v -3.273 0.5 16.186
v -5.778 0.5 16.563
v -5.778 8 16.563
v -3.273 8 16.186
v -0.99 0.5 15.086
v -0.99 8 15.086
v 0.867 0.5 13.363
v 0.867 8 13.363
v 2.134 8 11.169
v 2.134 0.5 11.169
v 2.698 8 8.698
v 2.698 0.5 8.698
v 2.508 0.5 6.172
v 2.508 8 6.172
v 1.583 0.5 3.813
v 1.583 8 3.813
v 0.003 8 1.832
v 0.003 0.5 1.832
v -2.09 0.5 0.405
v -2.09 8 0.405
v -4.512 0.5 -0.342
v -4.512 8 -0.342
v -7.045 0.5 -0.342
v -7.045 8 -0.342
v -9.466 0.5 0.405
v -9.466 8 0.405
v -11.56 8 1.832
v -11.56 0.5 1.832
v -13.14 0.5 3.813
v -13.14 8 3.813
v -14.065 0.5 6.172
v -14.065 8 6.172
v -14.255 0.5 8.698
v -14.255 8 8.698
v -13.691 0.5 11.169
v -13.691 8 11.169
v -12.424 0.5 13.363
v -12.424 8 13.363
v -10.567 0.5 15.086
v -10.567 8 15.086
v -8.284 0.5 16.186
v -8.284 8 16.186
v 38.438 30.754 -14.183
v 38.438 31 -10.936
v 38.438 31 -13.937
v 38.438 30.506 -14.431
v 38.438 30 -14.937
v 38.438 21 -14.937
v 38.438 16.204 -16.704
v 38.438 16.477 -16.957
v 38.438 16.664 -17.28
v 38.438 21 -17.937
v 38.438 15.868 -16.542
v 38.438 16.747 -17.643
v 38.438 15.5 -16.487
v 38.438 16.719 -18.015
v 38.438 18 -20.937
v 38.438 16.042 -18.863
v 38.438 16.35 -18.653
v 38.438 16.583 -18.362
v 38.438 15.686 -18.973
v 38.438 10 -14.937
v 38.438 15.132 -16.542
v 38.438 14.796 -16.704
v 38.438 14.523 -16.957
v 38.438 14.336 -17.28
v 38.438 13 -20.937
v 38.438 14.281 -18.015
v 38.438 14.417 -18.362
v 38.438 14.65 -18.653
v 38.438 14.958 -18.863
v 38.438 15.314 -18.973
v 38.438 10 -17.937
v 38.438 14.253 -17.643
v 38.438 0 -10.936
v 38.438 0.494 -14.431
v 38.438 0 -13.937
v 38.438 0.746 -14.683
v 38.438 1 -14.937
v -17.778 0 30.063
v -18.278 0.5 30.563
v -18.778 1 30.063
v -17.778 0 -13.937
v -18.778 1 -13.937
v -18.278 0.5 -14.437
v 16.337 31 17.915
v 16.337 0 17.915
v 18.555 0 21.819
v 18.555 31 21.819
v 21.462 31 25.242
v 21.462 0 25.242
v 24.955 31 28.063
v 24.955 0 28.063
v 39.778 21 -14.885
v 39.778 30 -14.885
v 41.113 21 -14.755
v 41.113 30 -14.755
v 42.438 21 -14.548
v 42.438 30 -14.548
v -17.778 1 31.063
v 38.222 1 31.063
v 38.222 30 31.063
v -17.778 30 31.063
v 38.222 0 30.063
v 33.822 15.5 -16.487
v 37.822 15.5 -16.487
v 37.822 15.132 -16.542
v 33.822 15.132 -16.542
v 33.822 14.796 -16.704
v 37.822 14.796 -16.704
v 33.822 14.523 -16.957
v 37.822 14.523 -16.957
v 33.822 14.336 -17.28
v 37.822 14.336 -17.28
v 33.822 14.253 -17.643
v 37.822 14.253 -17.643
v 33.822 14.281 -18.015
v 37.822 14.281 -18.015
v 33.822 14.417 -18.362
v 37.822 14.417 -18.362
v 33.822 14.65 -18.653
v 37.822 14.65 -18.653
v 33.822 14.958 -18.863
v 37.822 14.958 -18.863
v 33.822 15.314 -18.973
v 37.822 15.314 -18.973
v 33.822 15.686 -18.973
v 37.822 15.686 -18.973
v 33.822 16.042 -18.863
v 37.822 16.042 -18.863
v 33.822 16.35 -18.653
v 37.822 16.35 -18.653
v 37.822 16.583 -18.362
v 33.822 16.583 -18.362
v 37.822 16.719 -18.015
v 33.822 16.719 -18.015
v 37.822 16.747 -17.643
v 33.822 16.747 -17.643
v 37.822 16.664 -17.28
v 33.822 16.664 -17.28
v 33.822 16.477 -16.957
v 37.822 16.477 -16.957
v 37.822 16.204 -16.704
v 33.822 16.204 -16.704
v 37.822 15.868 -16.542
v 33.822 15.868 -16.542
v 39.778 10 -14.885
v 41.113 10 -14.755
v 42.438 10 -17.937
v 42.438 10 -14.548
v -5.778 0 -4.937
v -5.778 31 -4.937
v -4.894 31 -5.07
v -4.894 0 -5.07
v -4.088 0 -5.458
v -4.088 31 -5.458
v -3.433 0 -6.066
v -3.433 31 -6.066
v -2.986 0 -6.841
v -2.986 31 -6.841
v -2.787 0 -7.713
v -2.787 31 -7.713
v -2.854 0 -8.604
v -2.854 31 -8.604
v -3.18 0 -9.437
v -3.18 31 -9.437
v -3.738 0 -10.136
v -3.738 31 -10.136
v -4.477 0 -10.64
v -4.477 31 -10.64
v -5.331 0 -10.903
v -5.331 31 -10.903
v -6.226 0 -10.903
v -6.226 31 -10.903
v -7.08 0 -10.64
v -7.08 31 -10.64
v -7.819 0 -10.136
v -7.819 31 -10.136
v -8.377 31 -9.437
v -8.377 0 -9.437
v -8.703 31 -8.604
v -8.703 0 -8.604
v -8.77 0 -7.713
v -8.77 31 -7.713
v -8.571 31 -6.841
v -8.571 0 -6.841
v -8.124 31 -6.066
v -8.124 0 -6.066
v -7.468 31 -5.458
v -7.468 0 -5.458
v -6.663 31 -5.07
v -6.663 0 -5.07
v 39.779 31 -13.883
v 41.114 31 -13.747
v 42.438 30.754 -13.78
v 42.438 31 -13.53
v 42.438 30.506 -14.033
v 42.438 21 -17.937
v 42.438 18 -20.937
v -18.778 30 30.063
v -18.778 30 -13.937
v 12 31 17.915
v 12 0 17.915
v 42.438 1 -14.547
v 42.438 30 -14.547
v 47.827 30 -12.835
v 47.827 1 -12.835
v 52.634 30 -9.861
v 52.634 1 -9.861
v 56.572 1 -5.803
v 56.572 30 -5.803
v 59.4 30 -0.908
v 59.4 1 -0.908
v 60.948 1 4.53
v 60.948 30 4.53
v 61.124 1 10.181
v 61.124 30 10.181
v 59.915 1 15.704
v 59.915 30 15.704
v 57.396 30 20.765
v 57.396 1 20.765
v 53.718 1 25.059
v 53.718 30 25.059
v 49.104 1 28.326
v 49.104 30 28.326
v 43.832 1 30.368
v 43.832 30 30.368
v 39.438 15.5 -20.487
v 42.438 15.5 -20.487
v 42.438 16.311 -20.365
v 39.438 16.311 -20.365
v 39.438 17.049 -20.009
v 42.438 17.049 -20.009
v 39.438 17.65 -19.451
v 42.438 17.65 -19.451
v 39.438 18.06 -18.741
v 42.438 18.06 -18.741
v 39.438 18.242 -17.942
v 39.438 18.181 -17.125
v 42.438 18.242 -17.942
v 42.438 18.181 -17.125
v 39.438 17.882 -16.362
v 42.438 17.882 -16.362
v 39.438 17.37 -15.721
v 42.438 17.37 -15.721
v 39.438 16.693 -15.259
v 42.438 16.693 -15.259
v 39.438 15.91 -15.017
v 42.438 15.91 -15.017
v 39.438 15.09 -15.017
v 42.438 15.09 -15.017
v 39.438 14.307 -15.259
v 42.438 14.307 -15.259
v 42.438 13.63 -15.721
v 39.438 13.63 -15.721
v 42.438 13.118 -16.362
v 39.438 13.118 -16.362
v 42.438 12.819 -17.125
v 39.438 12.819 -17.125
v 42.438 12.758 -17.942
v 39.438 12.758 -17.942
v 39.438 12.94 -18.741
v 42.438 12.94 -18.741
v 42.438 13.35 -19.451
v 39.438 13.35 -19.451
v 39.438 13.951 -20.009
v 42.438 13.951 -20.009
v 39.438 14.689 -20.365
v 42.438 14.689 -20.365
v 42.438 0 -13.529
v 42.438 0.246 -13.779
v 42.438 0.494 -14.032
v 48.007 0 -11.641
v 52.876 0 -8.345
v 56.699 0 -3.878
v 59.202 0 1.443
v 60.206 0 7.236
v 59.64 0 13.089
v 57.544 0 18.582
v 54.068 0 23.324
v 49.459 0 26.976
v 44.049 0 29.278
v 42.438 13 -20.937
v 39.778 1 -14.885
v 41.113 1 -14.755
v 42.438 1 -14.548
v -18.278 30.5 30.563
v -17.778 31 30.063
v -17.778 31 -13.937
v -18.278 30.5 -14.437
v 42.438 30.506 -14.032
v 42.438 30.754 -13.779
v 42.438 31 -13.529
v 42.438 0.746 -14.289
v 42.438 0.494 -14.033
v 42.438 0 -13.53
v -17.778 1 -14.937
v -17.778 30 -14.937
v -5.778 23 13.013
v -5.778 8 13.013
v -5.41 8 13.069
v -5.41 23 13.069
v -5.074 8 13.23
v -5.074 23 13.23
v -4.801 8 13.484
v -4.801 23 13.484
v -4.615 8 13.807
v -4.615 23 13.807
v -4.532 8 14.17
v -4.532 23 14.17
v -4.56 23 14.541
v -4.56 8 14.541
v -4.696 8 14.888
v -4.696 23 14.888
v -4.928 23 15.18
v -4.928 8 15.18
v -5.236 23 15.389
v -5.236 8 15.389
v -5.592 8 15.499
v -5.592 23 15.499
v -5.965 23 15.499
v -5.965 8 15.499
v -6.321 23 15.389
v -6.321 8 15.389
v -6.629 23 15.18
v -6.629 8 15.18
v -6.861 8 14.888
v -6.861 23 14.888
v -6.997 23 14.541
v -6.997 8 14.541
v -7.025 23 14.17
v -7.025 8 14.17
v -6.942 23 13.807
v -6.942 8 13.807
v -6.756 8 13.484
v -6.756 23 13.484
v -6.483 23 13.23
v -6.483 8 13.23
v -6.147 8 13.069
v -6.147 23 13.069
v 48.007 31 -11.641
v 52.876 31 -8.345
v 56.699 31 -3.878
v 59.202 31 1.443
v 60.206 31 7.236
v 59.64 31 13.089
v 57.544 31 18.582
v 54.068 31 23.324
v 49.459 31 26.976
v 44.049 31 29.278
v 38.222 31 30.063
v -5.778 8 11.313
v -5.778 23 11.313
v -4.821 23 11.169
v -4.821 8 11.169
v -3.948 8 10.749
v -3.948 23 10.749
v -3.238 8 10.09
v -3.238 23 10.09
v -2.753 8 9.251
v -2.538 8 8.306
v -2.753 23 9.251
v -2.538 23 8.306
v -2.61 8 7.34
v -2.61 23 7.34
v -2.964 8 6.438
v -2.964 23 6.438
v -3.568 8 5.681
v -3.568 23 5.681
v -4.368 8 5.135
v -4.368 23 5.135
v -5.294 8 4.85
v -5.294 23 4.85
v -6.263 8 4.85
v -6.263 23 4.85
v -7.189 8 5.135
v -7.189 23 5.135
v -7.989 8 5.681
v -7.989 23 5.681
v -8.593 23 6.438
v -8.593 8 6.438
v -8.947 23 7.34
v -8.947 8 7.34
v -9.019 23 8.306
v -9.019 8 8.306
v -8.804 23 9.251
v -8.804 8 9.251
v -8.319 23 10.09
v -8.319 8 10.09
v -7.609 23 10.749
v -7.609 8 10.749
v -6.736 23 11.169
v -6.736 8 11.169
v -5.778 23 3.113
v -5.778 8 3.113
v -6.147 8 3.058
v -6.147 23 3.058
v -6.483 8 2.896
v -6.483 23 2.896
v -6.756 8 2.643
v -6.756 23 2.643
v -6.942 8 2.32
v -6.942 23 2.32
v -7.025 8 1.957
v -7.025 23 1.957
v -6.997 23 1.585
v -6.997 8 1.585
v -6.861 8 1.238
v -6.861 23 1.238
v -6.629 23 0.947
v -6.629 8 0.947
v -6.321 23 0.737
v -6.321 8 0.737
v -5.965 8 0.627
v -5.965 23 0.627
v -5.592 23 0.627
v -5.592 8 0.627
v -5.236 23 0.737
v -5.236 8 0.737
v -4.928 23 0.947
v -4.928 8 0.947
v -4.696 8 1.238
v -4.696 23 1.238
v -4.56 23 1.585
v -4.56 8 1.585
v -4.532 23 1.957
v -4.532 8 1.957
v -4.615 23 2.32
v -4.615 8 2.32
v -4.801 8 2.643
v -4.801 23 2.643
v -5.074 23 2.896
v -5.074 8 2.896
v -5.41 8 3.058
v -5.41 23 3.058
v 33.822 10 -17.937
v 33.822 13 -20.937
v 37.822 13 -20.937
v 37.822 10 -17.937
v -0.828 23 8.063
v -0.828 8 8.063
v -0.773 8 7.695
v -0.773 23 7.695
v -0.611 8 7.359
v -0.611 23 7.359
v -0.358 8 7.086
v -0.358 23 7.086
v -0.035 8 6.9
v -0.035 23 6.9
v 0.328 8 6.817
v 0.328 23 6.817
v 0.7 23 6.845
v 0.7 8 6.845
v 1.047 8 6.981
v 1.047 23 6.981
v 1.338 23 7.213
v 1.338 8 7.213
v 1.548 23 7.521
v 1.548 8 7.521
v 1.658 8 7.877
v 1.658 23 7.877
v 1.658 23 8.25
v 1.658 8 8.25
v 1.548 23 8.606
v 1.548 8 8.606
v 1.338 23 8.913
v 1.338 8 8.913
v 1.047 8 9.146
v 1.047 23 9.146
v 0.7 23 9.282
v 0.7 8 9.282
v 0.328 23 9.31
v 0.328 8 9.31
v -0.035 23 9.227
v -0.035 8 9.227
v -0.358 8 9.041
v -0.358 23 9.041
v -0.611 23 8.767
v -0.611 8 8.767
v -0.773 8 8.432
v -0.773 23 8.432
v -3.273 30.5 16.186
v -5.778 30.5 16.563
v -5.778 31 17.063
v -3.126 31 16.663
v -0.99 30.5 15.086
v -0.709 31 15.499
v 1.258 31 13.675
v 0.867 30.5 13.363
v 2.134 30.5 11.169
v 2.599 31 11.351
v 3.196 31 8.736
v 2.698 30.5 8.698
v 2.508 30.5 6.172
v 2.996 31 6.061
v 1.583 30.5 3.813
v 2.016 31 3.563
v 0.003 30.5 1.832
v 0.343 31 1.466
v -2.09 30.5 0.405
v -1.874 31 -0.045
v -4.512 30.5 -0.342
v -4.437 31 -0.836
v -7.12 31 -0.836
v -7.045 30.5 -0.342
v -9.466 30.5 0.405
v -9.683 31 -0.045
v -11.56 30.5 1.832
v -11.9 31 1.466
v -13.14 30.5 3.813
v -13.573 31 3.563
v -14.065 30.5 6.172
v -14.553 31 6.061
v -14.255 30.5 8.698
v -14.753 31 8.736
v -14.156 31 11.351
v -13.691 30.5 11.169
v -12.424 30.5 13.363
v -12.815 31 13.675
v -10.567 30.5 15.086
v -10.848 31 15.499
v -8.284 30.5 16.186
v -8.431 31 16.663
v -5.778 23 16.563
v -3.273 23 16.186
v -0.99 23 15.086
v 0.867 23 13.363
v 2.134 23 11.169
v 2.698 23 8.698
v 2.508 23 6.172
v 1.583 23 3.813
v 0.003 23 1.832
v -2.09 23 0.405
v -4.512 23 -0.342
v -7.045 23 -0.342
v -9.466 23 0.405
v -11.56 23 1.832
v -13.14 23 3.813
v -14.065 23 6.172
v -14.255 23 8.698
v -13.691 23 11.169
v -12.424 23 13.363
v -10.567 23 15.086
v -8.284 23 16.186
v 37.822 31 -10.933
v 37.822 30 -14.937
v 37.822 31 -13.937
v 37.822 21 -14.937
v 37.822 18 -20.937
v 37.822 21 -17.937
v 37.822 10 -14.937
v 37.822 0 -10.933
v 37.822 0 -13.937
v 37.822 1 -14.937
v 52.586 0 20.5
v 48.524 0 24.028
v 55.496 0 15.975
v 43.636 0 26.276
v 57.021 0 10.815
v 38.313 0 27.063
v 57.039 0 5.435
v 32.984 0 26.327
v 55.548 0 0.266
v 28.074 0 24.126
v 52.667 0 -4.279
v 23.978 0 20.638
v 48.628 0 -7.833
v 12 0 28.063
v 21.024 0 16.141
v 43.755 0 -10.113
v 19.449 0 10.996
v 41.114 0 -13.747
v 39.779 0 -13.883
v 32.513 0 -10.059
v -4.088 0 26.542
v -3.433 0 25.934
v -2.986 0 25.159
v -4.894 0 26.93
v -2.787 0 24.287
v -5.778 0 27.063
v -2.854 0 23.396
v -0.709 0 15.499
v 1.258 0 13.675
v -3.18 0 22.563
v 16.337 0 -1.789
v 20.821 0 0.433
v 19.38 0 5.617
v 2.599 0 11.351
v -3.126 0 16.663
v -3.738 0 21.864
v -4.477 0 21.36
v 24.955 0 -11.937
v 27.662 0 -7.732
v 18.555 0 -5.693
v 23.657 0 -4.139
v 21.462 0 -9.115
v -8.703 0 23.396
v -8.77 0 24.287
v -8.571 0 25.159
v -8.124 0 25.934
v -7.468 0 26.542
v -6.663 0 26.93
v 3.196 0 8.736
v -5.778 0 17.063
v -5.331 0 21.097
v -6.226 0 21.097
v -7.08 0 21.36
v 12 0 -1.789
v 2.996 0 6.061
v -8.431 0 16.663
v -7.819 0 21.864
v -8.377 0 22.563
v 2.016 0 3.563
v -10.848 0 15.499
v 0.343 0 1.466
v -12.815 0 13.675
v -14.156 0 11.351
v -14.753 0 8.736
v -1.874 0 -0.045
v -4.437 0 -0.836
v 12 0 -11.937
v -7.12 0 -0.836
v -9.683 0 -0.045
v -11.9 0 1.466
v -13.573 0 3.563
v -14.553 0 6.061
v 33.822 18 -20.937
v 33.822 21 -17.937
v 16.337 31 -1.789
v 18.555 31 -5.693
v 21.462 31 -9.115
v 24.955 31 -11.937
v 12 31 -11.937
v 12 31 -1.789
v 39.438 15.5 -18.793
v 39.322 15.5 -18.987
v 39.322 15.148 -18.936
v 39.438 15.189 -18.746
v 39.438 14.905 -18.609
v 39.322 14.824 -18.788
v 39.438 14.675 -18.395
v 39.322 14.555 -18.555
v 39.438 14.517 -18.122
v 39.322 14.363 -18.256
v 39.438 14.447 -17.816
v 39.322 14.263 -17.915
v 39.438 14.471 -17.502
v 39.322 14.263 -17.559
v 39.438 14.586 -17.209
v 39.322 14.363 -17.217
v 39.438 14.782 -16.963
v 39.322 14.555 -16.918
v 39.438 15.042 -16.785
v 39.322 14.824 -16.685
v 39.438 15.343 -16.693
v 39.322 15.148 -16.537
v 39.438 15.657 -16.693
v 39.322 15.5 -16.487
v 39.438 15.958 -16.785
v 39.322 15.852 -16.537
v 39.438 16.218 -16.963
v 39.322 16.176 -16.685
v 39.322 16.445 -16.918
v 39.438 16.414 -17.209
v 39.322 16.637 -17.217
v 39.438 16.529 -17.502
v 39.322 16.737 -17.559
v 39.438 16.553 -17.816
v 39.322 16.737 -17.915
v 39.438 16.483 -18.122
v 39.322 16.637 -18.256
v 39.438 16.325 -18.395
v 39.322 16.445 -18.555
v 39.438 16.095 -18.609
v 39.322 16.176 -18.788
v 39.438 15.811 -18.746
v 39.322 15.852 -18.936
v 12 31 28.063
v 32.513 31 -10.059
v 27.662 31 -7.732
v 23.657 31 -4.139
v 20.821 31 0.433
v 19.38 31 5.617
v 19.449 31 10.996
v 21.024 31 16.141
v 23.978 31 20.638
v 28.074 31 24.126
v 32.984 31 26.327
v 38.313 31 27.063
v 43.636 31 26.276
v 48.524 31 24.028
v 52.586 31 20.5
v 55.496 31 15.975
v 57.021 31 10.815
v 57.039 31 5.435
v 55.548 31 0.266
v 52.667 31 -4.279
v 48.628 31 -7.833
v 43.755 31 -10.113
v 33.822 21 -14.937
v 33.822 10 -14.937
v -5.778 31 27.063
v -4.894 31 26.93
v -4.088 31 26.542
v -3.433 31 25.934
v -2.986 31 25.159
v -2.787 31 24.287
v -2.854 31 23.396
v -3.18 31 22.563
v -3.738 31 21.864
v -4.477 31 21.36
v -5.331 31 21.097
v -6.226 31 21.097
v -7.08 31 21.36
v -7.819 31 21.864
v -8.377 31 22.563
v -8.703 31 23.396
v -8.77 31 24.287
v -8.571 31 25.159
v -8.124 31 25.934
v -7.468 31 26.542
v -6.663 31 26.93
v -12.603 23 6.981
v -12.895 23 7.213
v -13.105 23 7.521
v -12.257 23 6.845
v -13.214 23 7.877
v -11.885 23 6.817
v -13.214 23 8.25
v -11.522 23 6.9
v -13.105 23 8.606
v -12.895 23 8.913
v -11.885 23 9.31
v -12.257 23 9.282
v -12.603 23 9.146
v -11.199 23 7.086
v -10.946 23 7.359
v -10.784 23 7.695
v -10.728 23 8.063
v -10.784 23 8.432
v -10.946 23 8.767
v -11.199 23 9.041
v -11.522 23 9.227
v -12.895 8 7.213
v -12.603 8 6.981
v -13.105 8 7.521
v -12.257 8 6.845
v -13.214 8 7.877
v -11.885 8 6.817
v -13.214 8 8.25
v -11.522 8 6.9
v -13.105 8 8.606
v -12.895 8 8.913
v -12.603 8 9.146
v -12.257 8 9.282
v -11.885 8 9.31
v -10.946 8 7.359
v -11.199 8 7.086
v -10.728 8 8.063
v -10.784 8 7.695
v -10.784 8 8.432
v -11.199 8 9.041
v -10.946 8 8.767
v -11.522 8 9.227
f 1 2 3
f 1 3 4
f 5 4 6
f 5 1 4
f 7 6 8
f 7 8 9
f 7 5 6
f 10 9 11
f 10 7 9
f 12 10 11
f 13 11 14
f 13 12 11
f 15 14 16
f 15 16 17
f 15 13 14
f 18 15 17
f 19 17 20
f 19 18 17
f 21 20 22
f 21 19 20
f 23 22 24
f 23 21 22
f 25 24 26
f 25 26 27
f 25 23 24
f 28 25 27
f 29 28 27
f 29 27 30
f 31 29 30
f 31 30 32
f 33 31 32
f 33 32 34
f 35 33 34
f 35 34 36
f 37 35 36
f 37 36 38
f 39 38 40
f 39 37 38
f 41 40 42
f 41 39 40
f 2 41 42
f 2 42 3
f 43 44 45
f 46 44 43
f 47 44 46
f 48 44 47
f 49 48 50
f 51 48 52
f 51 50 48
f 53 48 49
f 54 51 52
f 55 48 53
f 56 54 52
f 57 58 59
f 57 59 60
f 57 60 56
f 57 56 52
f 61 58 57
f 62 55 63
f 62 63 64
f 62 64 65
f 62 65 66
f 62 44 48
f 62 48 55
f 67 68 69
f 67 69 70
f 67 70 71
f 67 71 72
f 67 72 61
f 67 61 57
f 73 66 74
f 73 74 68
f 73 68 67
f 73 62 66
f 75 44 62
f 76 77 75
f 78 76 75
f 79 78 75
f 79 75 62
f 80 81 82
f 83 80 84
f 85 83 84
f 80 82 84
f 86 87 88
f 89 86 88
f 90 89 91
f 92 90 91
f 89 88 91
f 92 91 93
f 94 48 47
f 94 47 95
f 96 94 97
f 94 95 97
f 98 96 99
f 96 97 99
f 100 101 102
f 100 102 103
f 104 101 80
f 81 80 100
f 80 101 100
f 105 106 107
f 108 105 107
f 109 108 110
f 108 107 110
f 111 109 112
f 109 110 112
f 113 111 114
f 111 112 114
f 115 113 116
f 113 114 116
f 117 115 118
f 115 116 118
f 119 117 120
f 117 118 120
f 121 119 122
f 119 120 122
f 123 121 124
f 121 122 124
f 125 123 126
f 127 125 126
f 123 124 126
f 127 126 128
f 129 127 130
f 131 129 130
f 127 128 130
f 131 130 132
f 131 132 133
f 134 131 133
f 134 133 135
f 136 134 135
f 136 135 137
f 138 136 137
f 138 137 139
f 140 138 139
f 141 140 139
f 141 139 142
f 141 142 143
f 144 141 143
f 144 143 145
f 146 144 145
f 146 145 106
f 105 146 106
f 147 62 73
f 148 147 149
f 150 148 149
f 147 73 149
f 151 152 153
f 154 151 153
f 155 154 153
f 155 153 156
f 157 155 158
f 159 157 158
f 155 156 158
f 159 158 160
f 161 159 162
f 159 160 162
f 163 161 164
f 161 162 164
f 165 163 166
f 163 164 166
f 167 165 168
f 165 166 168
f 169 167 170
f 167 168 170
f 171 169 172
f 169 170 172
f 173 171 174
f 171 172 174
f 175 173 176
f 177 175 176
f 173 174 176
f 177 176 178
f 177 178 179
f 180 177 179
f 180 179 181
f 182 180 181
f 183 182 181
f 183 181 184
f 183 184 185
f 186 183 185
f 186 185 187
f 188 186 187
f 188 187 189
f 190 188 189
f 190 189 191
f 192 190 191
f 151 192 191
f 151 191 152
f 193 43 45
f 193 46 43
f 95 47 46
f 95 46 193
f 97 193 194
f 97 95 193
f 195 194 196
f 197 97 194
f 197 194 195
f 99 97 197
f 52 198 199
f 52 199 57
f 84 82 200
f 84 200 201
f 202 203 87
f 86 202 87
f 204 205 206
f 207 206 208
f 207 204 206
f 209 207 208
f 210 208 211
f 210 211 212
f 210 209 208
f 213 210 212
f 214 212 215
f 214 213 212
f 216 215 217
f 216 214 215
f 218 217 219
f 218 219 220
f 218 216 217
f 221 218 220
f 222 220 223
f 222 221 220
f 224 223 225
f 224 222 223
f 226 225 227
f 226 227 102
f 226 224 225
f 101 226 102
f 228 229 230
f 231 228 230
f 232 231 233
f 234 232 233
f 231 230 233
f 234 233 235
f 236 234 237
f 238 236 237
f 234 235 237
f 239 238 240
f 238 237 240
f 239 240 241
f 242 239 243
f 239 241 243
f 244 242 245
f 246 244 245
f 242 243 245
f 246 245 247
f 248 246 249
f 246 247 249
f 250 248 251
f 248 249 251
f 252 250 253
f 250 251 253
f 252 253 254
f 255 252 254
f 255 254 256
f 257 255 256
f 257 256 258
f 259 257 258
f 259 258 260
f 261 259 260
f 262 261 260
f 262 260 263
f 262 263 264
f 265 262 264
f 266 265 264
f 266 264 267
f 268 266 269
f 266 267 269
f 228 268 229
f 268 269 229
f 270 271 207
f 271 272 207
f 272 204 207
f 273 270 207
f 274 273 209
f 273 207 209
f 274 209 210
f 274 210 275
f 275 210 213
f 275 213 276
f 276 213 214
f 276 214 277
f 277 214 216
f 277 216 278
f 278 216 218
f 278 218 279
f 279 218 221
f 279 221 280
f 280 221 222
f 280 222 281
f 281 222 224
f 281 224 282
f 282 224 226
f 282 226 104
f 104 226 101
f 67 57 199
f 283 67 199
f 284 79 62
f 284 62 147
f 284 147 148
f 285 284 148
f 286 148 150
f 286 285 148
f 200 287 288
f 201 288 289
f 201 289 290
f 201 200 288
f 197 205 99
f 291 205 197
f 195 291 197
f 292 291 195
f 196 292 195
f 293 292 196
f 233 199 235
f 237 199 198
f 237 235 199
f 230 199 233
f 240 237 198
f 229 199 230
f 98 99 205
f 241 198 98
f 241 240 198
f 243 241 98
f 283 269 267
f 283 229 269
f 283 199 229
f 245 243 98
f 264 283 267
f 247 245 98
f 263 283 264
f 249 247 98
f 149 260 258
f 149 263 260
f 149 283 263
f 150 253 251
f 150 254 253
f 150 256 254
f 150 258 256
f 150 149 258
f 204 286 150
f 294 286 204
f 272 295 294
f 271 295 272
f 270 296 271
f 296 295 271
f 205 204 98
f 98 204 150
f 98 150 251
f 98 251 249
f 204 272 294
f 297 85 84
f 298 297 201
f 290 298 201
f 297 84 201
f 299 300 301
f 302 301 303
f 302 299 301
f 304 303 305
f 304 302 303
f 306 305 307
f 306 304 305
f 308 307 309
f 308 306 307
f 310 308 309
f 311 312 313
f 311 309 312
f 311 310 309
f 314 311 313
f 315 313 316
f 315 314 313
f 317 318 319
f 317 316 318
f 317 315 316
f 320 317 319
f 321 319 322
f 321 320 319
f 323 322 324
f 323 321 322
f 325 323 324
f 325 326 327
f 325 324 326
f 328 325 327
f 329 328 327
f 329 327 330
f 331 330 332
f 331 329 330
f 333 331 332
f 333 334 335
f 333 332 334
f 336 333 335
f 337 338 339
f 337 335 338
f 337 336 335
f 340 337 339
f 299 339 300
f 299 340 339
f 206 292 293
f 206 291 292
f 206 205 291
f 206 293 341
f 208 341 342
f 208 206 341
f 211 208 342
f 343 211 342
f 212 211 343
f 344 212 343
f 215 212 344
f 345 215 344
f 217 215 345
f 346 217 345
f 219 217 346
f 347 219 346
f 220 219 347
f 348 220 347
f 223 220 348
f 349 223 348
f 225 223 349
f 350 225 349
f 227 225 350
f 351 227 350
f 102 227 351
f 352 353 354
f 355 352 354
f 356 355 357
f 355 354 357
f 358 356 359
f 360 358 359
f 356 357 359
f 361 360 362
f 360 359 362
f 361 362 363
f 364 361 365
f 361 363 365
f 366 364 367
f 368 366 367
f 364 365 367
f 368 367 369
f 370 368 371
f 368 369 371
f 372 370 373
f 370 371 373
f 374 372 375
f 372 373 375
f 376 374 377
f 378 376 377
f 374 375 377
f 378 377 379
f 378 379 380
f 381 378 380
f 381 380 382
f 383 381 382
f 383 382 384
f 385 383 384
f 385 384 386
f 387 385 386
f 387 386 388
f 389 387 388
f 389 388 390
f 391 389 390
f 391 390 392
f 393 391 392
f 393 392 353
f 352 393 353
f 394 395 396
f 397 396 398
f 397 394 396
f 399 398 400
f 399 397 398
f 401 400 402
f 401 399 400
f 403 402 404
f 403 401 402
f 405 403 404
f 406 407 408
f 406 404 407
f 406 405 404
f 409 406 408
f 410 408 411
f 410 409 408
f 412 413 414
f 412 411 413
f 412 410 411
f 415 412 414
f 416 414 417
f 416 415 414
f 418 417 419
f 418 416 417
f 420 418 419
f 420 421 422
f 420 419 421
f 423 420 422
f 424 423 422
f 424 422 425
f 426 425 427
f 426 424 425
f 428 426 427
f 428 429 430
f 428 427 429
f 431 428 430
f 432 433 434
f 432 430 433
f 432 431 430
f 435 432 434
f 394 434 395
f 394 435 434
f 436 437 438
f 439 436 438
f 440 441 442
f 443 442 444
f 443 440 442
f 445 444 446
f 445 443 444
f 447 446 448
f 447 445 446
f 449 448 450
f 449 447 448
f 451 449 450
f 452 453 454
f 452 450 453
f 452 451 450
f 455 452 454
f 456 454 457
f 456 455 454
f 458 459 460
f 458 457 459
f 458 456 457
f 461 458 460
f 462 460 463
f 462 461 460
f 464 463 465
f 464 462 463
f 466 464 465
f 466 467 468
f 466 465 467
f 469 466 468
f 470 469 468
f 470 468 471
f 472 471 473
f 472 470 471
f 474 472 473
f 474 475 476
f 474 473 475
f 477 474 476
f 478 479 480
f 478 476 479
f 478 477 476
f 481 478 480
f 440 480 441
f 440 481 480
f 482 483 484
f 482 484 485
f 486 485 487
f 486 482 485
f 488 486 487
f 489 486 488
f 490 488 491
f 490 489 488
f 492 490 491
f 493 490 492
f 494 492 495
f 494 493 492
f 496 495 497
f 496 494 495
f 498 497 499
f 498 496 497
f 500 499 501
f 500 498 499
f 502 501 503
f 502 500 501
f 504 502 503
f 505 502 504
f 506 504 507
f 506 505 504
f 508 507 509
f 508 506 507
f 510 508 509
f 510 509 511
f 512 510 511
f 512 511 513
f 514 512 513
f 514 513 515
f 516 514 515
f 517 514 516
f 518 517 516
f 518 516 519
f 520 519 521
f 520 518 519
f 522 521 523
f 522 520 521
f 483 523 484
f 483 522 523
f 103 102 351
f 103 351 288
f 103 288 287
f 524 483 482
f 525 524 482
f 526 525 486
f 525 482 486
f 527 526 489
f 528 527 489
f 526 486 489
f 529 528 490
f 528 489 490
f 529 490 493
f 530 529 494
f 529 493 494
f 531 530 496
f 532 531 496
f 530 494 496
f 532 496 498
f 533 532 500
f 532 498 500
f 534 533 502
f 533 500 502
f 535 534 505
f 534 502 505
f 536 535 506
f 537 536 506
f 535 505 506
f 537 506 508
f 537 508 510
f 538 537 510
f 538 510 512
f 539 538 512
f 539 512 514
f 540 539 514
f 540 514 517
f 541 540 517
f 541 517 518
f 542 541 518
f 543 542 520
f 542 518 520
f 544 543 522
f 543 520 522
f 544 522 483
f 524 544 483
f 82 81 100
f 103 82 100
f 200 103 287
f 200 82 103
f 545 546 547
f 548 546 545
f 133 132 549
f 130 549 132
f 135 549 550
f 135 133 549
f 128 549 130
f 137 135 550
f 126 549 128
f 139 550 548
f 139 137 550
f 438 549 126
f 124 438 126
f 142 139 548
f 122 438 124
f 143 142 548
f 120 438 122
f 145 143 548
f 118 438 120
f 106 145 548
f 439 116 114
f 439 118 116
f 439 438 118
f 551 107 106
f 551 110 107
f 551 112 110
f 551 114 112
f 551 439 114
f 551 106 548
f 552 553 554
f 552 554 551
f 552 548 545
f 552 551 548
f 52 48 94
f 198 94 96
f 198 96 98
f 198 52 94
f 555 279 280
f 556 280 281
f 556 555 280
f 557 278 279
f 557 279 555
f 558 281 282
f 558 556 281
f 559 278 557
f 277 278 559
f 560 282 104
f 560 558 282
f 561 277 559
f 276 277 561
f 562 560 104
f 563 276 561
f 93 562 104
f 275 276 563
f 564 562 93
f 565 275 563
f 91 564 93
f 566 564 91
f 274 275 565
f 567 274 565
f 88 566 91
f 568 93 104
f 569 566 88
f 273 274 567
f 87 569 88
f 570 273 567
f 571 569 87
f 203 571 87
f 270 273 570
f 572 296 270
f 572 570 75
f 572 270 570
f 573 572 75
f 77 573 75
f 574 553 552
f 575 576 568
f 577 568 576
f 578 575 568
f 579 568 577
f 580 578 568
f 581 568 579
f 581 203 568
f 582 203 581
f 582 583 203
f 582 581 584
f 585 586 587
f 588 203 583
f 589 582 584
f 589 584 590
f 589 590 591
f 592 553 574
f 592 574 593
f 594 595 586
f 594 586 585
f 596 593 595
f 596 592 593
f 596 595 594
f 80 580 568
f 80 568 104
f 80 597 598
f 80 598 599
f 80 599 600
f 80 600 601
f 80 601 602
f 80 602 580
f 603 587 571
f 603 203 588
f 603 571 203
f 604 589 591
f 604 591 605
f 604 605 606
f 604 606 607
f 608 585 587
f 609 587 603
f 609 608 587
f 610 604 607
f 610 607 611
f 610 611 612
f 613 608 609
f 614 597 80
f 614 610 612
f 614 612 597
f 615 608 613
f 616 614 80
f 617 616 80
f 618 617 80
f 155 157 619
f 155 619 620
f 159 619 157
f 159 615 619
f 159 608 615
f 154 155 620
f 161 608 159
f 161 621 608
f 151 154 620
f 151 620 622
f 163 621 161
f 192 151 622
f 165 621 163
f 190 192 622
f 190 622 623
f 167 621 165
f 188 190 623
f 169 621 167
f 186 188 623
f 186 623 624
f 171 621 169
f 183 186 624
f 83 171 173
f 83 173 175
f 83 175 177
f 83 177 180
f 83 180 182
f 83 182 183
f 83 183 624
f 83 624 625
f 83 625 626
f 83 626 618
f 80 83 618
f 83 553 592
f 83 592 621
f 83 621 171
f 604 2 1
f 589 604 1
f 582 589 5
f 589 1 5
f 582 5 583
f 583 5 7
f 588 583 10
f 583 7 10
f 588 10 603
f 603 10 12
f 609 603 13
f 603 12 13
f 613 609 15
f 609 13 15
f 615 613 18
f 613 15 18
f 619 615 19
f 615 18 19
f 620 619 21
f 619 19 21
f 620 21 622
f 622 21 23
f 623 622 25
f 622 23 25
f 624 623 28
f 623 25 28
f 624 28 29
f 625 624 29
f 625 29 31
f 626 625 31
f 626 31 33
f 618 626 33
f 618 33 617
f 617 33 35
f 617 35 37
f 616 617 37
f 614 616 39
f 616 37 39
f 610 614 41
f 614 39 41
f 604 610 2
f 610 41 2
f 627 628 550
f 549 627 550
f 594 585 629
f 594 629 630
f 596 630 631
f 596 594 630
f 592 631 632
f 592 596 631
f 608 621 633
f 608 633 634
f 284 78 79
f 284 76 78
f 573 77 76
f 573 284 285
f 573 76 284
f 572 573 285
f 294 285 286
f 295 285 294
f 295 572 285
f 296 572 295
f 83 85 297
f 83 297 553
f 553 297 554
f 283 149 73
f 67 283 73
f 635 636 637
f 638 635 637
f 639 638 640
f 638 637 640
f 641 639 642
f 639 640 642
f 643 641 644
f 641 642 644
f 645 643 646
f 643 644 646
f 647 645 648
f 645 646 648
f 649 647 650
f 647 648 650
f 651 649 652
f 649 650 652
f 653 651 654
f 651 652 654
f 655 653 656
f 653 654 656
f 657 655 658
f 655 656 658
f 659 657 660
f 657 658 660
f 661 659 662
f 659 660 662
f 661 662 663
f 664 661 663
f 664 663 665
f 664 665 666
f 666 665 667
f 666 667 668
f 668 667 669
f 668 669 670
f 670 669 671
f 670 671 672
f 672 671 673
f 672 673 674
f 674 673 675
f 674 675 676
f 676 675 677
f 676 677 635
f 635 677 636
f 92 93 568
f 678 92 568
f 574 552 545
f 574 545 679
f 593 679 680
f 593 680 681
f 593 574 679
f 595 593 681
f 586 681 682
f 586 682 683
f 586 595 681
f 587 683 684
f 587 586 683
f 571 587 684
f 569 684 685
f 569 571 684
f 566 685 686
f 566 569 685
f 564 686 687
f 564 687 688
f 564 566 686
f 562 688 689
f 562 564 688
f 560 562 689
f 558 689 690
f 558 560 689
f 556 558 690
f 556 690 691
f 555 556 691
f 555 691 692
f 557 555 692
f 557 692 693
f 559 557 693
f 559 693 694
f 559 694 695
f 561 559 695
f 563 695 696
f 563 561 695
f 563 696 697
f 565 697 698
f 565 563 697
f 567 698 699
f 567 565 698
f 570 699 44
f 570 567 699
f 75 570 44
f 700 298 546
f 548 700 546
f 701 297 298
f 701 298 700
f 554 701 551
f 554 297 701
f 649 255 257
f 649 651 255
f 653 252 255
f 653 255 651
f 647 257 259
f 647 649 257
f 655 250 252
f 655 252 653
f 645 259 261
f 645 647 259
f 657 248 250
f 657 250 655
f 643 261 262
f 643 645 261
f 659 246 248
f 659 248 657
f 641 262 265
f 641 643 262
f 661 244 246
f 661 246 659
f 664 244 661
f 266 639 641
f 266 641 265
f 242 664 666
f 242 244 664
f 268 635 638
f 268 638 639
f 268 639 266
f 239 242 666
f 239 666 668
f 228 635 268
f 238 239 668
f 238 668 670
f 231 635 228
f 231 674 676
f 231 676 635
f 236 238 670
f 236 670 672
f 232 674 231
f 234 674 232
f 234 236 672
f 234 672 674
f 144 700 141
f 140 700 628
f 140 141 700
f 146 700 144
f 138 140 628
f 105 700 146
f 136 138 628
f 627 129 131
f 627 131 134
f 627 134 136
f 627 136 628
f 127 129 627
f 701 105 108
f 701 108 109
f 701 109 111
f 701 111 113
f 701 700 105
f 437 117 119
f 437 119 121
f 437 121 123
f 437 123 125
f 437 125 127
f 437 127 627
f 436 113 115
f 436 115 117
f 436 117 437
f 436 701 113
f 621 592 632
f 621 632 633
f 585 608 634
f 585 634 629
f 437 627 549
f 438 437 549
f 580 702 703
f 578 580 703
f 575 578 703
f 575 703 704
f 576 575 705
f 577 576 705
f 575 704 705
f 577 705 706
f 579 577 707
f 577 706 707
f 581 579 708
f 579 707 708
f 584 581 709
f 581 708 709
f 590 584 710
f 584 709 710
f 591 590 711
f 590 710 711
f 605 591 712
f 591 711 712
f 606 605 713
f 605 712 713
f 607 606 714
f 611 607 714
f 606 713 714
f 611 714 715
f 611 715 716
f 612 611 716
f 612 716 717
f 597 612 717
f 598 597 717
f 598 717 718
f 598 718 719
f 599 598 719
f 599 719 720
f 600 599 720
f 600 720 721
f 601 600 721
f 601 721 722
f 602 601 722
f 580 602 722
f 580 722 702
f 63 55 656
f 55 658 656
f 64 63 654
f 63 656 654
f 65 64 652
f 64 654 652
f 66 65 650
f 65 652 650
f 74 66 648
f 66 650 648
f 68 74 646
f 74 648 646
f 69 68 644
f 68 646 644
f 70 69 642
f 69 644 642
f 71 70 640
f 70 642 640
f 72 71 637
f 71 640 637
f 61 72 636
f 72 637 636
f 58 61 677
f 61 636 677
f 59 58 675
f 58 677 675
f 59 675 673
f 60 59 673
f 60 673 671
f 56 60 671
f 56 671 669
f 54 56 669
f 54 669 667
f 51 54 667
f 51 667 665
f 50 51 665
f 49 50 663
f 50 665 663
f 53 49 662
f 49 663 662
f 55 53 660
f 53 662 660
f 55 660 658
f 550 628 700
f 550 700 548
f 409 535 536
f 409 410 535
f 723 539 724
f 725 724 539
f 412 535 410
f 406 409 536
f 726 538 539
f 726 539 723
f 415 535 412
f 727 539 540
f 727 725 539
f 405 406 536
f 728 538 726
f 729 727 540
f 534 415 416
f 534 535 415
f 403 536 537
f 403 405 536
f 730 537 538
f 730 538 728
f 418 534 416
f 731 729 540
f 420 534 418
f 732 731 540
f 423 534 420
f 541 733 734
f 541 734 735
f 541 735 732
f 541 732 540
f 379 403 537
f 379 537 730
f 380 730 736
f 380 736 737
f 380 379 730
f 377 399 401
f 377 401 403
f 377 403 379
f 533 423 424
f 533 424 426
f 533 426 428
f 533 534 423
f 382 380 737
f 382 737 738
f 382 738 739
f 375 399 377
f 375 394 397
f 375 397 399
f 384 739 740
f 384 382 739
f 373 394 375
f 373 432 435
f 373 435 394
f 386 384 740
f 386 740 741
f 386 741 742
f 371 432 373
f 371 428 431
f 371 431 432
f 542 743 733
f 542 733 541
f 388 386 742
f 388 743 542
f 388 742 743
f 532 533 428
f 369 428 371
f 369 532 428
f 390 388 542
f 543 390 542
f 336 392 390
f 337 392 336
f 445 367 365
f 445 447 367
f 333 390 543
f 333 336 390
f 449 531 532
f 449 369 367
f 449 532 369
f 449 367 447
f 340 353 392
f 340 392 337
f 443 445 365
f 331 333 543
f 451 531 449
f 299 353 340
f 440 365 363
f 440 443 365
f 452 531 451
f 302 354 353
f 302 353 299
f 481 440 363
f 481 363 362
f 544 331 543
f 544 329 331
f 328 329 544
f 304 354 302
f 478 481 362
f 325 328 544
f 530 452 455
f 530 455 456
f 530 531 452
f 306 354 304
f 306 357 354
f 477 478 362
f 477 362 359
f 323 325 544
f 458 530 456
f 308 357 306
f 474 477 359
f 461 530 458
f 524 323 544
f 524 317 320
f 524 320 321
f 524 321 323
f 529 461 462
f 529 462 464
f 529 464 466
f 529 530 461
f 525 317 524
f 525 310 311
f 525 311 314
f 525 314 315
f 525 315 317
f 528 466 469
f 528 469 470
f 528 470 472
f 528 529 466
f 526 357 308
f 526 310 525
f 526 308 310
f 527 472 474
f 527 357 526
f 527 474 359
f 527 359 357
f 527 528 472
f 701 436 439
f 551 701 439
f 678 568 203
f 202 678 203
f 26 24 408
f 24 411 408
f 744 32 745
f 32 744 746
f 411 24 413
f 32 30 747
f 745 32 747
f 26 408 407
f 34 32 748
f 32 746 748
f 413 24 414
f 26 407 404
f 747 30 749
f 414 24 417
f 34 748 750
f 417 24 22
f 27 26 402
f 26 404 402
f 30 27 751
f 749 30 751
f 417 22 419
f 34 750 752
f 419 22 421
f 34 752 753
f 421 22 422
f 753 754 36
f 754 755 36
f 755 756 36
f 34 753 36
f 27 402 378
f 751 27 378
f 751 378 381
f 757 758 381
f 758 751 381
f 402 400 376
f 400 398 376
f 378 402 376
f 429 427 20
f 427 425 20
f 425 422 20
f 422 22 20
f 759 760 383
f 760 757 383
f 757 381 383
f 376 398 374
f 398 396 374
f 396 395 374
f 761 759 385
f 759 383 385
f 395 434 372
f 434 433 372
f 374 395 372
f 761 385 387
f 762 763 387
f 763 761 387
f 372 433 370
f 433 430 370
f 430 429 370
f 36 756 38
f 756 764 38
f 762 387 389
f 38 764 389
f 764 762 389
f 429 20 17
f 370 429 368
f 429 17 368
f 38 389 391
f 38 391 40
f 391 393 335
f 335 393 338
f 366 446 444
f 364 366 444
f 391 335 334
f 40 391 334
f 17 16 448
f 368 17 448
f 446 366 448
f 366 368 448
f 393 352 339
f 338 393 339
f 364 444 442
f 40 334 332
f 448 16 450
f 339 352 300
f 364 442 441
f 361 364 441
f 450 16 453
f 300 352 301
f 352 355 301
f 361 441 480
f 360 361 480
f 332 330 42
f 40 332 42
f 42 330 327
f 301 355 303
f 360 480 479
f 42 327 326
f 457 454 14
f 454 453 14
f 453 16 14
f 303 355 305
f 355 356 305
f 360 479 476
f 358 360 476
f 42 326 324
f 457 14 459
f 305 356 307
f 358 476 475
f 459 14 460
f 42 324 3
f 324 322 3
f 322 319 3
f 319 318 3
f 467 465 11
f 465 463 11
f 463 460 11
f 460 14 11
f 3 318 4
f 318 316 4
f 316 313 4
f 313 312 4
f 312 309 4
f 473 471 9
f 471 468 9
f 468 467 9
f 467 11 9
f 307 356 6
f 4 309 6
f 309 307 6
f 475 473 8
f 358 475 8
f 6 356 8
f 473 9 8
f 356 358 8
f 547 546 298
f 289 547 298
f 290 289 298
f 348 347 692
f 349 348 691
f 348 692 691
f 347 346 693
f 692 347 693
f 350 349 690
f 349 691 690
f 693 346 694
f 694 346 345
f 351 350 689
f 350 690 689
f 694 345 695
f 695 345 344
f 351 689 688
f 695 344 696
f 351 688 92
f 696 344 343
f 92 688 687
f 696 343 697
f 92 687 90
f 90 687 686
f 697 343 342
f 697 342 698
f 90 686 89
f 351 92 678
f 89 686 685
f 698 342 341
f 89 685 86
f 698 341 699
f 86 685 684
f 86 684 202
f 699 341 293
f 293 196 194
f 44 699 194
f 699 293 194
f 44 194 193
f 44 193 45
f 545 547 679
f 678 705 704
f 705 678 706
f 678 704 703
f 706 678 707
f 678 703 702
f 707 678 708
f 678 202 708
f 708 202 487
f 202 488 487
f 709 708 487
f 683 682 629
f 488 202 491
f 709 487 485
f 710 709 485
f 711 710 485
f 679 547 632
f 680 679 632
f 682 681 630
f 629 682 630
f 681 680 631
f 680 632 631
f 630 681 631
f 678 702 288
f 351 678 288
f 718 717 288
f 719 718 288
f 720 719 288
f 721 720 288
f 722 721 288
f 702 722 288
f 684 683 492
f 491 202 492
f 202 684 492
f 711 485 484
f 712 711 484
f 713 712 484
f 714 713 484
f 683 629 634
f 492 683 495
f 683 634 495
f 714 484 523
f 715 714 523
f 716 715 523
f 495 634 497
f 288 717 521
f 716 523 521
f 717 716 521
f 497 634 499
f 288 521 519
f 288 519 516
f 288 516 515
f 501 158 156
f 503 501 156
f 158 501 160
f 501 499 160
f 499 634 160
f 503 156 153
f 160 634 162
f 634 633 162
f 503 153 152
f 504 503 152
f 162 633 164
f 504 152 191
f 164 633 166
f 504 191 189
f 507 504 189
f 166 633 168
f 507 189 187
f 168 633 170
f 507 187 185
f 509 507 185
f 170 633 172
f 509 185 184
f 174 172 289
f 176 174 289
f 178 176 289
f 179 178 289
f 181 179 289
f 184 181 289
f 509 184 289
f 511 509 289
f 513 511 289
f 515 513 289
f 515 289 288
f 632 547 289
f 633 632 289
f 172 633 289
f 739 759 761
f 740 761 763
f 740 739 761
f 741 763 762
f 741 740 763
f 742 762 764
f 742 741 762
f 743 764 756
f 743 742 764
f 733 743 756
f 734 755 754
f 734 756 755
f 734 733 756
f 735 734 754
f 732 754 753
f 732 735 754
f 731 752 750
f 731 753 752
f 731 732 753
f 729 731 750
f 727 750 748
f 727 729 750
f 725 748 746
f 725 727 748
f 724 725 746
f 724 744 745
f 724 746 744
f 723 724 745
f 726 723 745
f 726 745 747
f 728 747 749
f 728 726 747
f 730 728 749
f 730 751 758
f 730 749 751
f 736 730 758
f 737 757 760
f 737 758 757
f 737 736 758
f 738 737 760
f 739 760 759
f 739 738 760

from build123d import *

# Parameters (mm, degrees)
BOSS_EXTRUDE1_DEPTH       = 31
SKETCH2_W                 = 4
SKETCH2_H                 = 6
CUT_EXTRUDE1_DEPTH        = 10
CHAMFER1_SIZE             = 3
SKETCH3_R                 = 1
CUT_EXTRUDE2_DEPTH        = 12
SKETCH4_R                 = 2.75
CUT_EXTRUDE3_DEPTH        = 3
M3X0_5_TAPPED_HOLE1_D     = 2.5
M3X0_5_TAPPED_HOLE1_DEPTH = 5.5
M3X0_5_TAPPED_HOLE1_TIP   = 0.751075774
CHAMFER2_SIZE             = 1
CHAMFER3_SIZE             = 1
CHAMFER4_SIZE             = 1
CHAMFER5_SIZE             = 1
CHAMFER6_SIZE             = 1
SKETCH6_R                 = 3
CUT_EXTRUDE4_DEPTH        = 76.325976363
SKETCH7_R                 = 8.5
CUT_EXTRUDE5_DEPTH        = 8
CHAMFER7_SIZE             = 0.5
CHAMFER8_SIZE             = 0.5
SKETCH8_R                 = 3.25
CUT_EXTRUDE6_DEPTH        = 73.401676189
SKETCH9_R                 = 1
CUT_EXTRUDE7_DEPTH        = 26
CIRPATTERN1_COUNT         = 4


with BuildPart() as part:
    # Sketch1 → Boss-Extrude1 (new body)
    with BuildSketch(Plane(origin=(0, 0, 0), x_dir=(1, 0, 0), z_dir=(0, 1, 0))):
        with BuildLine():
            Line((38.438211647, 10.935520299), (38.438211647, 20.93675572))
            Line((38.438211647, 20.93675572), (42.438211647, 20.93675572))
            Line((42.438211647, 20.93675572), (42.438211647, 14.546924278))
            ThreePointArc((42.438211647, 14.546924278), (61.123879761, -10.180568437), (38.22154498, -31.06324428))
            Line((38.22154498, -31.06324428), (-18.77845502, -31.06324428))
            Line((-18.77845502, -31.06324428), (-18.77845502, 14.93675572))
            Line((-18.77845502, 14.93675572), (33.82154498, 14.93675572))
            Line((33.82154498, 14.93675572), (33.82154498, 20.93675572))
            Line((33.82154498, 20.93675572), (37.82154498, 20.93675572))
            Line((37.82154498, 20.93675572), (37.82154498, 10.932544727))
            ThreePointArc((37.82154498, 10.932544727), (38.31322372, -27.063023095), (38.438211647, 10.935520299))
        make_face()
        with BuildLine():
            Line((12, 11.93675572), (12, 1.788697084))
            Line((12, 1.788697084), (16.336864234, 1.788697084))
            ThreePointArc((16.336864234, 1.788697084), (19.928181819, 7.472291251), (24.955045819, 11.93675572))
            Line((24.955045819, 11.93675572), (12, 11.93675572))
        make_face(mode=Mode.SUBTRACT)
        with BuildLine():
            Line((12, -17.915185645), (16.336864234, -17.915185645))
            ThreePointArc((16.336864234, -17.915185645), (19.928181819, -23.598779812), (24.955045819, -28.06324428))
            Line((24.955045819, -28.06324428), (12, -28.06324428))
            Line((12, -28.06324428), (12, -17.915185645))
        make_face(mode=Mode.SUBTRACT)
    extrude(amount=BOSS_EXTRUDE1_DEPTH)

    # Sketch2 → Cut-Extrude1 (cut)
    with BuildSketch(Plane(origin=(0, 31, 0), x_dir=(1, 0, 0), z_dir=(0, 1, 0))):
        with BuildLine():
            Line((38.438211647, 20.93675572), (38.438211647, 14.93675572))
            ThreePointArc((38.438211647, 14.93675572), (40.446719395, 14.829888823), (42.438211647, 14.547962381))
            Line((42.438211647, 14.547962381), (42.438211647, 20.93675572))
            Line((42.438211647, 20.93675572), (38.438211647, 20.93675572))
        make_face()
        with Locations((35.82154498, 17.93675572)):
            Rectangle(SKETCH2_W, SKETCH2_H)
    cut_extrude1 = extrude(amount=-CUT_EXTRUDE1_DEPTH, mode=Mode.SUBTRACT)

    # Mirror1: Cut-Extrude1 across plane
    add(cut_extrude1.mirror(Plane.ZX.offset(15.5)), mode=Mode.SUBTRACT)

    # Chamfer1
    chamfer1_edges = [part.edges().sort_by_distance(p)[0] for p in [
        (40.438211647, 10, -20.93675572),
        (35.82154498, 10, -20.93675572),
        (40.438211647, 21, -20.93675572),
        (35.82154498, 21, -20.93675572),
    ]]
    chamfer(chamfer1_edges, length=CHAMFER1_SIZE)

    # Sketch3 → Cut-Extrude2 (cut)
    with BuildSketch(Plane(origin=(42.438211647, 0, 0), x_dir=(0, 0, -1), z_dir=(1, 0, 0))):
        with Locations((17.73675572, 15.5)):
            Circle(SKETCH3_R)
    extrude(amount=-CUT_EXTRUDE2_DEPTH, mode=Mode.SUBTRACT)

    # Sketch4 → Cut-Extrude3 (cut)
    with BuildSketch(Plane(origin=(42.438211647, 0, 0), x_dir=(0, 0, -1), z_dir=(1, 0, 0))):
        with Locations((17.73675572, 15.5)):
            Circle(SKETCH4_R)
    extrude(amount=-CUT_EXTRUDE3_DEPTH, mode=Mode.SUBTRACT)

    # M3x0.5 Tapped Hole1
    with Locations(Plane(origin=(33.82154498, 15.5, -17.73675572), x_dir=(0, 0, -1), z_dir=(-1, 0, 0))):
        with Locations((0, 0)):
            Hole(M3X0_5_TAPPED_HOLE1_D / 2, depth=M3X0_5_TAPPED_HOLE1_DEPTH)
            with Locations((0, 0, -(M3X0_5_TAPPED_HOLE1_DEPTH + M3X0_5_TAPPED_HOLE1_TIP / 2))):  # 118° drill point
                Cone(0, M3X0_5_TAPPED_HOLE1_D / 2, M3X0_5_TAPPED_HOLE1_TIP, mode=Mode.SUBTRACT)

    # Chamfer2
    chamfer2_edges = [part.edges().sort_by_distance(p)[0] for p in [
        (61.123879761, 31, 10.180568437),
        (9.52154498, 31, -14.93675572),
        (-18.77845502, 31, 8.06324428),
        (9.72154498, 31, 31.06324428),
    ]]
    chamfer(chamfer2_edges, length=CHAMFER2_SIZE)

    # Chamfer3
    chamfer3_edges = [part.edges().sort_by_distance(p)[0] for p in [
        (40.446719395, 31, -14.829888823),
    ]]
    chamfer(chamfer3_edges, length=CHAMFER3_SIZE)

    # Chamfer4
    chamfer4_edges = [part.edges().sort_by_distance(p)[0] for p in [
        (9.52154498, 0, -14.93675572),
        (61.123879761, 0, 10.180568437),
        (9.72154498, 0, 31.06324428),
        (-18.77845502, 0, 8.06324428),
    ]]
    chamfer(chamfer4_edges, length=CHAMFER4_SIZE)

    # Chamfer5
    chamfer5_edges = [part.edges().sort_by_distance(p)[0] for p in [
        (40.446719395, 0, -14.829888823),
    ]]
    chamfer(chamfer5_edges, length=CHAMFER5_SIZE)

    # Chamfer6
    chamfer6_edges = [part.edges().sort_by_distance(p)[0] for p in [
        (-18.77845502, 15.5, -14.93675572),
        (-18.77845502, 15.5, 31.06324428),
    ]]
    chamfer(chamfer6_edges, length=CHAMFER6_SIZE)

    # Sketch6 → Cut-Extrude4 (cut, through all)
    with BuildSketch(Plane(origin=(0, 31, 0), x_dir=(1, 0, 0), z_dir=(0, 1, 0))):
        with Locations(Location((-5.77845502, -24.06324428, 0), (0, 0, 270))):
            Circle(SKETCH6_R)
        with Locations(Location((-5.77845502, 7.93675572, 0), (0, 0, 270))):
            Circle(SKETCH6_R)
    extrude(amount=-CUT_EXTRUDE4_DEPTH, mode=Mode.SUBTRACT)

    # Sketch7 → Cut-Extrude5 (cut)
    with BuildSketch(Plane(origin=(0, 31, 0), x_dir=(1, 0, 0), z_dir=(0, 1, 0))):
        with Locations(Location((-5.77845502, -8.06324428, 0), (0, 0, 270))):
            Circle(SKETCH7_R)
    cut_extrude5 = extrude(amount=-CUT_EXTRUDE5_DEPTH, mode=Mode.SUBTRACT)

    # Chamfer7
    chamfer7_edges = [part.edges().sort_by_distance(p)[0] for p in [
        (-5.77845502, 31, -0.43675572),
    ]]
    chamfer(chamfer7_edges, length=CHAMFER7_SIZE)

    # Mirror3: Cut-Extrude5 across plane
    add(cut_extrude5.mirror(Plane.ZX.offset(15.5)), mode=Mode.SUBTRACT)

    # Chamfer8
    chamfer8_edges = [part.edges().sort_by_distance(p)[0] for p in [
        (-5.77845502, 0, -0.43675572),
    ]]
    chamfer(chamfer8_edges, length=CHAMFER8_SIZE)

    # Sketch8 → Cut-Extrude6 (cut, through all)
    with BuildSketch(Plane(origin=(0, 23, 0), x_dir=(1, 0, 0), z_dir=(0, 1, 0))):
        with Locations(Location((-5.77845502, -8.06324428, 0), (0, 0, 270))):
            Circle(SKETCH8_R)
    extrude(amount=-CUT_EXTRUDE6_DEPTH, mode=Mode.SUBTRACT)

    # Sketch9 → Cut-Extrude7 (cut)
    with BuildSketch(Plane(origin=(0, 23, 0), x_dir=(1, 0, 0), z_dir=(0, 1, 0))):
        with Locations(Location((-5.77845502, -1.86324428, 0), (0, 0, 270))):
            Circle(SKETCH9_R)
    cut_extrude7 = extrude(amount=-CUT_EXTRUDE7_DEPTH, mode=Mode.SUBTRACT)

    # Sketch10 → M3x0.5 Tapped Hole2 (revolve, cut)
    with BuildSketch(Plane(origin=(-5.77845502, 23, 1.86324428), x_dir=(0, 0, 1), z_dir=(1, 0, 0))):
        Polygon((0, 0), (0, 27.251075774), (1.25, 26.5), (1.25, 0), align=None)
    m3x0_5_tapped_hole2 = revolve(axis=Axis((-5.77845502, 29.35, 1.86324428), (0, -1, 0)), mode=Mode.SUBTRACT)

    # CirPattern1: Cut-Extrude7, M3x0.5 Tapped Hole2 ×4 about axis
    cirpattern1_axis = Axis((-5.77845502, 0, 8.06324428), (0, 1, 0))
    add([cut_extrude7.rotate(cirpattern1_axis, i * 360 / CIRPATTERN1_COUNT) for i in range(1, CIRPATTERN1_COUNT)], mode=Mode.SUBTRACT)
    add([m3x0_5_tapped_hole2.rotate(cirpattern1_axis, i * 360 / CIRPATTERN1_COUNT) for i in range(1, CIRPATTERN1_COUNT)], mode=Mode.SUBTRACT)


solid = part.part
